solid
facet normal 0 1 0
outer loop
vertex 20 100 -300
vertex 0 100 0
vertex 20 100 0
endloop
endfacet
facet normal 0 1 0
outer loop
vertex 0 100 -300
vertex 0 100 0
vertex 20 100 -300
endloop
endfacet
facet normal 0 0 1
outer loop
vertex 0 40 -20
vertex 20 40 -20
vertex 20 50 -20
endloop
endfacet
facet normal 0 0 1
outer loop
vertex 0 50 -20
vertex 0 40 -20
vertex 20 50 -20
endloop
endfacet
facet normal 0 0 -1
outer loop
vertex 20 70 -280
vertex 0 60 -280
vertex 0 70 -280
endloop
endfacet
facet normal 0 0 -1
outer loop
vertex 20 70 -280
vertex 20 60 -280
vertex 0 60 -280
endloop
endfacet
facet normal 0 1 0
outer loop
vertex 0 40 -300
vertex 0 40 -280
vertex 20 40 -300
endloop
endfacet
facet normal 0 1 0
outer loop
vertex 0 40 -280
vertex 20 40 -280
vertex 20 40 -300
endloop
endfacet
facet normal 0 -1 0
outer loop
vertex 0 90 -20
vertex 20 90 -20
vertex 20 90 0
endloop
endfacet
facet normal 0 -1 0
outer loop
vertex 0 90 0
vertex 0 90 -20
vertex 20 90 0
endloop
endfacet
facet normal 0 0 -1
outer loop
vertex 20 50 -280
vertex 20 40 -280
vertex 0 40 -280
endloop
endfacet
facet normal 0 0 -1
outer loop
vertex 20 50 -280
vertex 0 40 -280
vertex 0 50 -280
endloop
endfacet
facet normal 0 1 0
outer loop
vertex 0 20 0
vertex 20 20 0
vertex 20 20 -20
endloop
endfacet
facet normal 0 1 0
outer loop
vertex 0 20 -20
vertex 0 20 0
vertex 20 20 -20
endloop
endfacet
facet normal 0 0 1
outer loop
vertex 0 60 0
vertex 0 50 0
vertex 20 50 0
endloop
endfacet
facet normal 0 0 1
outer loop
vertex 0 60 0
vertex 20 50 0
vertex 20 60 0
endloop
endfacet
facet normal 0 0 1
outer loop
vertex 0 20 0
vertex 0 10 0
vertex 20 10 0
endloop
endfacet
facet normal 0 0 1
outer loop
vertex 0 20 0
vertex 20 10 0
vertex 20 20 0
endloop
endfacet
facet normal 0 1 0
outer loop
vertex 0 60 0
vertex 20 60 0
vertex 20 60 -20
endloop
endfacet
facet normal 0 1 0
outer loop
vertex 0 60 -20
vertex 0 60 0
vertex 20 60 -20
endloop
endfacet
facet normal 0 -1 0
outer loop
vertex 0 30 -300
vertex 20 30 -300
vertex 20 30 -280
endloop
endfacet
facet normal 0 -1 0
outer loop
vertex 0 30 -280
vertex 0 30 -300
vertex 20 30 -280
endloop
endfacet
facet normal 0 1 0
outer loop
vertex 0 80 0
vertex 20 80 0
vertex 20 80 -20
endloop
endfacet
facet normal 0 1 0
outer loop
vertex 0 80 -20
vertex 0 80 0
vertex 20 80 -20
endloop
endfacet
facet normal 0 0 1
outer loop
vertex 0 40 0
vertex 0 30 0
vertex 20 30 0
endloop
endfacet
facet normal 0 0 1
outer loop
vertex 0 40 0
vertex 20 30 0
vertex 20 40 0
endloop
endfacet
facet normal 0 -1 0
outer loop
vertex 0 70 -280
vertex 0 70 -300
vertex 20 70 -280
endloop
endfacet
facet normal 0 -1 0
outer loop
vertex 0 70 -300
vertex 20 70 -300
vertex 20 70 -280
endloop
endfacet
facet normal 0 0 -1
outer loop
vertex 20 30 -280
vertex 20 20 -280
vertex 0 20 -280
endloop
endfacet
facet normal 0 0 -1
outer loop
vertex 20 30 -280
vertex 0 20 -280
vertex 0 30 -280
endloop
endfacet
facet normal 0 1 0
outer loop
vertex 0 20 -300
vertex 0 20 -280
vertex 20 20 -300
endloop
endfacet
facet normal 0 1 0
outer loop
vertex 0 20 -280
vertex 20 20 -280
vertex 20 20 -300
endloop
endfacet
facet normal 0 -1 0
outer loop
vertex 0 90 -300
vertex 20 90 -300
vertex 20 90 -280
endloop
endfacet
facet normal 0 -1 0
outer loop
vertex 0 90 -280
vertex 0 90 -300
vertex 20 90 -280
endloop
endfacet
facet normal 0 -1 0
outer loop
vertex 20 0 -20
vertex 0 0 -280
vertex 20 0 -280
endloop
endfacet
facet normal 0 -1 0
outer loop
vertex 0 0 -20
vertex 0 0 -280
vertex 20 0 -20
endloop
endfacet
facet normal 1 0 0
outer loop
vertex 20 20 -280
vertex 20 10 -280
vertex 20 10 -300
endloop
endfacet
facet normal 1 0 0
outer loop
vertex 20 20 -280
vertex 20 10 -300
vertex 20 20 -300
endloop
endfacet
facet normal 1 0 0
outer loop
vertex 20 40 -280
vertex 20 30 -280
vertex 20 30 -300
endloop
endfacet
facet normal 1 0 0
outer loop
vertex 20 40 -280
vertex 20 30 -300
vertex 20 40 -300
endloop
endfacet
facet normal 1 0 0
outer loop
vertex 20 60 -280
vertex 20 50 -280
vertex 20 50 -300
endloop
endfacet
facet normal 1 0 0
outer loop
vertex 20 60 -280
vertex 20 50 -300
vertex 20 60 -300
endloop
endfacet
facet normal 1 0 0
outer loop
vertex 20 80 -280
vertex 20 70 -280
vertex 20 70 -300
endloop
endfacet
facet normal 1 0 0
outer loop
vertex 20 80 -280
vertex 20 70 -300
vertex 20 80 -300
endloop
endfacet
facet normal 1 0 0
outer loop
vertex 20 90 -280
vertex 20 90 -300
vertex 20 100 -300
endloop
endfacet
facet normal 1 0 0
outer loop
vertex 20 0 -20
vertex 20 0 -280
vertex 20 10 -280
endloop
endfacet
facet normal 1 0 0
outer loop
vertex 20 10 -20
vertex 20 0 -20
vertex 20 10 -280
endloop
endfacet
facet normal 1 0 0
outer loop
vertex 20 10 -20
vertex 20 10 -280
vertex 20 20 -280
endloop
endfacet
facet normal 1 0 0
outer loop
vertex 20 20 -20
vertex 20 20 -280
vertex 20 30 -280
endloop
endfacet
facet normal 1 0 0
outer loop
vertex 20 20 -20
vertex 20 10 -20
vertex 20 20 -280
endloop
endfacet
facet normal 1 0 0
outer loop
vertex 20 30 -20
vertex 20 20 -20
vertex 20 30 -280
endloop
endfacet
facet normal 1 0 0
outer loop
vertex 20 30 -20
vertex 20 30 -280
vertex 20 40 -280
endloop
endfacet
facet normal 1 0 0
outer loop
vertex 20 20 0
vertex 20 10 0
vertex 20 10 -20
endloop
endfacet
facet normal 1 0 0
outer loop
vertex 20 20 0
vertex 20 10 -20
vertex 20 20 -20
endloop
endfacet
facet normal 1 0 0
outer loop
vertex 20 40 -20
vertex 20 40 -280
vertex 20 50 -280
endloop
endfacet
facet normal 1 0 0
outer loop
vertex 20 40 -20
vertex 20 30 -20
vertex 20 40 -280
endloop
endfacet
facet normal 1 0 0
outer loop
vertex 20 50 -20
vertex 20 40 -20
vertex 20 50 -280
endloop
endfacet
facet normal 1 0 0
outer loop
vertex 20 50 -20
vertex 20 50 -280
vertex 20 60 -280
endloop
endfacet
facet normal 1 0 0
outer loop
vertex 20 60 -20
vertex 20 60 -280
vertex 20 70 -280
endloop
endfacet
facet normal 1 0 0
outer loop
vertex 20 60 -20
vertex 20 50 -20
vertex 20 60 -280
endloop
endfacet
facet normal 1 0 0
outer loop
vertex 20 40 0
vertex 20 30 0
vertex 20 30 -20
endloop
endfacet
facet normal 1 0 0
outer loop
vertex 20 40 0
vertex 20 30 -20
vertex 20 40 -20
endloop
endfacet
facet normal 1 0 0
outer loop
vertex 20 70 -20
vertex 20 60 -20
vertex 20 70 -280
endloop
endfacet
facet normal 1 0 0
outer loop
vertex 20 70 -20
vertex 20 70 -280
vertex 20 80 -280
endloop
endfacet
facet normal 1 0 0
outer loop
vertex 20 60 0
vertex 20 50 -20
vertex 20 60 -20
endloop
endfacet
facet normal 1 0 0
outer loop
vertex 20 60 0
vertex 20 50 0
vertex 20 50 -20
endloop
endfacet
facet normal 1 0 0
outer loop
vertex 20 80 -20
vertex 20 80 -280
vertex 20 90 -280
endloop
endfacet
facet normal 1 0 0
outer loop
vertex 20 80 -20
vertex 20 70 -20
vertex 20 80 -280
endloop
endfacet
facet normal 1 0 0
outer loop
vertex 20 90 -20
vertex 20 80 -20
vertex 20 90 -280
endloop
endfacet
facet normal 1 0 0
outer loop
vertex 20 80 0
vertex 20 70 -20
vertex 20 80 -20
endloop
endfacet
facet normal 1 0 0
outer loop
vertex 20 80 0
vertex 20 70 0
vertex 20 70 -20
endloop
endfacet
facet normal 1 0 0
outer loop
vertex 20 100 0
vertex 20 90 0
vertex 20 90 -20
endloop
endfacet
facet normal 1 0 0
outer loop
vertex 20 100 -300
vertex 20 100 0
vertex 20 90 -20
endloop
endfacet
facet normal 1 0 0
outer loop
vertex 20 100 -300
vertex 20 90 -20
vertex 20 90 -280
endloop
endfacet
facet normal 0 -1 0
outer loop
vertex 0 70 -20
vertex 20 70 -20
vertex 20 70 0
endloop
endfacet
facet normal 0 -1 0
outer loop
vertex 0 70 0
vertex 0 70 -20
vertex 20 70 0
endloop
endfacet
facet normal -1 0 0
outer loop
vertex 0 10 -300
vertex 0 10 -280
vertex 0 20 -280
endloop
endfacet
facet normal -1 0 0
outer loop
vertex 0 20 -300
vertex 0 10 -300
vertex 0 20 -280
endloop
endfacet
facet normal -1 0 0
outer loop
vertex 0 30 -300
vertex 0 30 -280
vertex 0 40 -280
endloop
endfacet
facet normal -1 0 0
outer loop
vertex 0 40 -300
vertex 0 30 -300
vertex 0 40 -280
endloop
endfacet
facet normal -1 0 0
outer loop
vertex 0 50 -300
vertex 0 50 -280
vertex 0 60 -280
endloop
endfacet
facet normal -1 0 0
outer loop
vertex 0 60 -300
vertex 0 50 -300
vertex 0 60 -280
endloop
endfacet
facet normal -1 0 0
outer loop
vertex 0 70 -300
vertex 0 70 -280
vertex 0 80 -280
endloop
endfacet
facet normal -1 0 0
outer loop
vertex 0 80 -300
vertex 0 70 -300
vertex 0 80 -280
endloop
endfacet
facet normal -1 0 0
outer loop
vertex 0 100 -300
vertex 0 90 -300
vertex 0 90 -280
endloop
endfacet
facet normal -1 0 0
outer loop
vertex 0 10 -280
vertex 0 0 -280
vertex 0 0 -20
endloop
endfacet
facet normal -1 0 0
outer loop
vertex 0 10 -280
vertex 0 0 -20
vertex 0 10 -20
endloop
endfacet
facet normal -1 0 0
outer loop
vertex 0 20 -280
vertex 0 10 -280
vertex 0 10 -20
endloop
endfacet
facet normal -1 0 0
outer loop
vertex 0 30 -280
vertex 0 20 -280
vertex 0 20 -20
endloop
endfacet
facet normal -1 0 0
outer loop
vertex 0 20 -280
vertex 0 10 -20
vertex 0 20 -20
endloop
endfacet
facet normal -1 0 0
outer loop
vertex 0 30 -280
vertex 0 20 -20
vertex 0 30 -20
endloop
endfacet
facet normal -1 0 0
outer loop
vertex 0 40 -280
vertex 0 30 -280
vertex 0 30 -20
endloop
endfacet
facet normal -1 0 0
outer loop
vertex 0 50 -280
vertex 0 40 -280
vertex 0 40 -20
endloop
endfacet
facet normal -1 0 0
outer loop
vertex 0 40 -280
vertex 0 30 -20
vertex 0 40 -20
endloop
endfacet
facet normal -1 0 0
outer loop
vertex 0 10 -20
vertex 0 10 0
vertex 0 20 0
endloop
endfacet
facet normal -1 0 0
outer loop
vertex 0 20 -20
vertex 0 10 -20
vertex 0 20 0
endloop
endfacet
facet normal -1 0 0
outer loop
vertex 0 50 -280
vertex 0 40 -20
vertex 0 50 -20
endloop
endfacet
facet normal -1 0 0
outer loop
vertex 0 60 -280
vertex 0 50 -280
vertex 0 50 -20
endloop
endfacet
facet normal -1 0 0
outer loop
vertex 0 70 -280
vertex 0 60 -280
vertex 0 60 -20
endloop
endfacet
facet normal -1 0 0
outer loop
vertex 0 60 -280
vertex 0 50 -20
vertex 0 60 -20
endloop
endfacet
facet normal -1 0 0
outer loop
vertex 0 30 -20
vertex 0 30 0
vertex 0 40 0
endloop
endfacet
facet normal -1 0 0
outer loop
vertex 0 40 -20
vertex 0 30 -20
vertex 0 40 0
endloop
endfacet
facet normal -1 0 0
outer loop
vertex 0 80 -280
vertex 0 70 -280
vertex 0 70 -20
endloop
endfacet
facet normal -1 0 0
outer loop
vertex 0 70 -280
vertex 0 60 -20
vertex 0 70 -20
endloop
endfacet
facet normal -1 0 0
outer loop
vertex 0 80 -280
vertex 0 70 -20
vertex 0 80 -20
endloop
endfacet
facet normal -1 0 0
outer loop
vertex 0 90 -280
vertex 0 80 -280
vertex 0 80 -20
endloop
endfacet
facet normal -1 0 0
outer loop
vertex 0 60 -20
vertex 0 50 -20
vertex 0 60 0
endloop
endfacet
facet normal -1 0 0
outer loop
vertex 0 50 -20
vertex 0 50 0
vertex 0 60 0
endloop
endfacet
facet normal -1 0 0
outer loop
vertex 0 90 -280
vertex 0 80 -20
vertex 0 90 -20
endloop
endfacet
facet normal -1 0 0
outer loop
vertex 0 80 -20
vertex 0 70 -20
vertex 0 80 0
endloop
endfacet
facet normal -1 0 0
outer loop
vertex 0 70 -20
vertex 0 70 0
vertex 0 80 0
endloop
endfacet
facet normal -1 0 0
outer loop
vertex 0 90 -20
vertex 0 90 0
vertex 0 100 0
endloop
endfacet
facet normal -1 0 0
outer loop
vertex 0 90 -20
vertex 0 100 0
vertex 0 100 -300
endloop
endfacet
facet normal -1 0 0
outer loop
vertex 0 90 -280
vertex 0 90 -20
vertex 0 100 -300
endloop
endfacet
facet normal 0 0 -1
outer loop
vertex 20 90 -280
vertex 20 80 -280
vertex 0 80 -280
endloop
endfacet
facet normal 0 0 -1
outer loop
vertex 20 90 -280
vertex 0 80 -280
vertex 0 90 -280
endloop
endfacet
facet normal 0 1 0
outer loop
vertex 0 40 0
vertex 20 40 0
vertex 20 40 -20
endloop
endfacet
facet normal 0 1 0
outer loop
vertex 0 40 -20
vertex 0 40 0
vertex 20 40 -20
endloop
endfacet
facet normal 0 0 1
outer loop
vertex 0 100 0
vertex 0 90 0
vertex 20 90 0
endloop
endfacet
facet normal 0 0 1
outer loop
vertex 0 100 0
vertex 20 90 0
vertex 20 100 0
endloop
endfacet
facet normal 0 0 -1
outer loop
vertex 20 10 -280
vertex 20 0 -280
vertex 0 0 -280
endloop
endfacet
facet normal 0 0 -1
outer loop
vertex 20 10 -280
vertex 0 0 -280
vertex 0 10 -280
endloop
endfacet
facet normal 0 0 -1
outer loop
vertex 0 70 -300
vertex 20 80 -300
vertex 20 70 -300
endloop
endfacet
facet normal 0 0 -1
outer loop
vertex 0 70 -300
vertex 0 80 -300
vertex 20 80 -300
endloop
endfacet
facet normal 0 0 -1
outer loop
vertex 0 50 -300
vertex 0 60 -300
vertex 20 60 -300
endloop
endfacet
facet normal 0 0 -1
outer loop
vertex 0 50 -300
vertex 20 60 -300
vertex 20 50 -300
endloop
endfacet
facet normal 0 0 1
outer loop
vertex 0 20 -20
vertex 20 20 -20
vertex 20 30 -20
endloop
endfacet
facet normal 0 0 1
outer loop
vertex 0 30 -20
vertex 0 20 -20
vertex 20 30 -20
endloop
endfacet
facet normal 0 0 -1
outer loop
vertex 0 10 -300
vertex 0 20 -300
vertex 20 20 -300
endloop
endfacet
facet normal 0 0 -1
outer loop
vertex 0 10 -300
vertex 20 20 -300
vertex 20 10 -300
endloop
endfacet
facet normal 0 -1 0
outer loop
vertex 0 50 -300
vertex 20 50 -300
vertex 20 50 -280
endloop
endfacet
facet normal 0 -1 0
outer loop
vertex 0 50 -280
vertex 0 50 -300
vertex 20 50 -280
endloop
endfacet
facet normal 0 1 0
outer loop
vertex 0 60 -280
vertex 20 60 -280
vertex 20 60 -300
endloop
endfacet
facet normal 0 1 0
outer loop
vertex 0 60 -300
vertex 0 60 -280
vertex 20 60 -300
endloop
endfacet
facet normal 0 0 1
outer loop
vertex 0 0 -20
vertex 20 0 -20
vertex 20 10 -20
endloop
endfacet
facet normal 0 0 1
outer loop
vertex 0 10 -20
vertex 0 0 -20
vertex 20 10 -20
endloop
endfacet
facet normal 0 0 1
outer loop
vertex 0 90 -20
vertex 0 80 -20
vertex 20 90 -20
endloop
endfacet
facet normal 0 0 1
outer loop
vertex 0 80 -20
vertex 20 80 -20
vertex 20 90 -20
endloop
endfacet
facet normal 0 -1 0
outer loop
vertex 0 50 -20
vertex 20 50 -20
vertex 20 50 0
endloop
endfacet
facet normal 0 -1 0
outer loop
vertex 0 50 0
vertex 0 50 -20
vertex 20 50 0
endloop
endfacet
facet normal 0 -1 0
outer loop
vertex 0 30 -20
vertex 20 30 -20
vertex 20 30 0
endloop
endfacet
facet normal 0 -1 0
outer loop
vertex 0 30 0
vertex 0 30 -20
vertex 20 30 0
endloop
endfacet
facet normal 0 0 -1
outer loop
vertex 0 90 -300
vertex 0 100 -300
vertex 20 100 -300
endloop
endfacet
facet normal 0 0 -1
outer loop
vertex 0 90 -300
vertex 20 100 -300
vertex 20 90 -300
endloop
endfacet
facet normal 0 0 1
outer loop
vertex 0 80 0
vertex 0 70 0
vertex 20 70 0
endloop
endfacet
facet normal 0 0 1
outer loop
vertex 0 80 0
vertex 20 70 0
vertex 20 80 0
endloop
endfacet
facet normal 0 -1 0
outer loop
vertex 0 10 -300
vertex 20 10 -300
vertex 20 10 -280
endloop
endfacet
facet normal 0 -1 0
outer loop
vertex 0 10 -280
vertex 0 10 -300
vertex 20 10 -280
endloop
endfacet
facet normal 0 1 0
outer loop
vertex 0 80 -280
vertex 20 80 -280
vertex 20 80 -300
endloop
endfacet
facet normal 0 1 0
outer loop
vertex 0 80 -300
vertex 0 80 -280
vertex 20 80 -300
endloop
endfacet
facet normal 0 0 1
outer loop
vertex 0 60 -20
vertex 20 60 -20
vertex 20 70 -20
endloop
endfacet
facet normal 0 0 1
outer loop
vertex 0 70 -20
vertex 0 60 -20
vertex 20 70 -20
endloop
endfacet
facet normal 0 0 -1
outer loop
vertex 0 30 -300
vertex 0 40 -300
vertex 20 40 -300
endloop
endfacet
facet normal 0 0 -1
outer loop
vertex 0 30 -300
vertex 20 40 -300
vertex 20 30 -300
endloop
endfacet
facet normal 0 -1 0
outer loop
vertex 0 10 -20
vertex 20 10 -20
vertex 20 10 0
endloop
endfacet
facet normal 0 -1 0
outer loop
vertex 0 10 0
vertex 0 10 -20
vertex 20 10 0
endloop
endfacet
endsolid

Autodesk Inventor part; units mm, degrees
ref_plane "YZ Plane" through (0, 0, 0) normal (1, 0, 0) x (0, 1, 0)
ref_plane "XZ Plane" through (0, 0, 0) normal (0, 1, 0) x (-1, 0, 0)
ref_plane "XY Plane" through (0, 0, 0) normal (0, 0, 1) x (1, 0, 0)
sketch "Sketch1" plane through (0, 0, 0) normal (1, 0, 0) x (0, 1, 0)
  point P0 (0, 0)
sketch "Sketch2" plane through (0, 0, 0) normal (1, 0, 0) x (0, 1, 0)
  line L0 (0, 0) -> (100, 0)
  line L1 (100, 0) -> (100, -300)
  line L2 (100, -300) -> (0, -300)
  line L3 (0, -300) -> (0, 0)
  dimension "d0" = 100
  dimension "d1" = 300
extrude "Extrusion1" add sketch "Sketch2" along normal blind 20
sketch "Sketch3" plane through (20, 0, 0) normal (1, 0, 0) x (0, 0, -1)
  line L0 (0, 0) -> (20, 0)
  line L1 (20, 0) -> (20, 10)
  line L2 (20, 10) -> (0, 10)
  line L3 (0, 0) -> (0, 10)
  line L4 (0, 100) -> (0, 0) construction
  line L5 (0, 20) -> (20, 20)
  line L6 (20, 20) -> (20, 30)
  line L7 (20, 30) -> (0, 30)
  line L8 (0, 20) -> (0, 30)
  line L9 (0, 40) -> (20, 40)
  line L10 (20, 40) -> (20, 50)
  line L11 (20, 50) -> (0, 50)
  line L12 (0, 40) -> (0, 50)
  line L13 (0, 60) -> (20, 60)
  line L14 (20, 60) -> (20, 70)
  line L15 (20, 70) -> (0, 70)
  line L16 (0, 60) -> (0, 70)
  line L17 (0, 80) -> (20, 80)
  line L18 (20, 80) -> (20, 90)
  line L19 (20, 90) -> (0, 90)
  line L20 (0, 80) -> (0, 90)
  line L21 (0, 0) -> (300, 0) construction
  line L22 (280, 0) -> (300, 0)
  line L23 (300, 0) -> (300, 10)
  line L24 (300, 10) -> (280, 10)
  line L25 (280, 0) -> (280, 10)
  line L26 (280, 20) -> (300, 20)
  line L27 (300, 20) -> (300, 30)
  line L28 (280, 20) -> (280, 30)
  line L29 (300, 30) -> (280, 30)
  line L30 (280, 40) -> (300, 40)
  line L31 (300, 40) -> (300, 50)
  line L32 (280, 40) -> (280, 50)
  line L33 (300, 50) -> (280, 50)
  line L34 (280, 60) -> (300, 60)
  line L35 (300, 60) -> (300, 70)
  line L36 (300, 70) -> (280, 70)
  line L37 (280, 80) -> (300, 80)
  line L38 (300, 80) -> (300, 90)
  line L39 (300, 90) -> (280, 90)
  line L40 (280, 80) -> (280, 90)
  line L41 (280, 60) -> (280, 70)
  dimension "d17" = 1
  dimension "d5" = 10
  dimension "d6" = 20
  dimension "d9" = 20
  dimension "d16" = 280
  dimension "d21" = 10
extrude "Extrusion2" cut sketch "Sketch3" against normal blind 64.25
equation "\"d5\" = slot_width"
equation "\"d6\" = pattern_spacing"
equation "\"d9\" = pattern_spacing"
equation "\"d21\" = slot_spacing"
equation "\"slot_spacing\" = 10"
equation "\"slot_width\" = slot_spacing"
equation "\"pattern_spacing\" = 20"
properties part number "Parameter Practice"
